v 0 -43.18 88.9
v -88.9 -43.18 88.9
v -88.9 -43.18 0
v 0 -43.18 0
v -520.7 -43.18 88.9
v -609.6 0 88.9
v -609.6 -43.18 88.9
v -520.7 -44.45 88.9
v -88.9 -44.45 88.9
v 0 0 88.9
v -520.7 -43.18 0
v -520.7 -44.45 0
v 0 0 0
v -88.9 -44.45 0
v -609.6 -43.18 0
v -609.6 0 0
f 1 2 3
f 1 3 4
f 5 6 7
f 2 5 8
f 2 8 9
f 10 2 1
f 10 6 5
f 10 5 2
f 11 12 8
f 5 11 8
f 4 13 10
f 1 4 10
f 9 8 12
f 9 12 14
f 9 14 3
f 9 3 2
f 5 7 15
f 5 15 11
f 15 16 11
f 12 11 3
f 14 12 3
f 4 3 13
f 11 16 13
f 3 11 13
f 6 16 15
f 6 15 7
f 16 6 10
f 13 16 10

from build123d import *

# Parameters (mm, degrees)
F0_W     = 609.6
F0_H     = 88.9
F1_DEPTH = 44.45
F2_W     = 88.9
F2_H     = 88.9
F3_DEPTH = 1.27
F4_DEPTH = 1.27


with BuildPart() as f1:
    # F0 (on Front) → F1 (new body)
    with BuildSketch(Plane.XZ):
        with Locations((-304.8, 44.45)):
            Rectangle(F0_W, F0_H)
    extrude(amount=F1_DEPTH)

    # F2 (on face) → F3 (cut)
    with BuildSketch(Plane.XZ.offset(44.45)):
        with Locations((-565.15, 44.45)):
            Rectangle(F2_W, F2_H)
    extrude(amount=-F3_DEPTH, mode=Mode.SUBTRACT)

    # F2 (on face) → F4 (cut)
    with BuildSketch(Plane.XZ.offset(44.45)):
        with Locations((-44.45, 44.45)):
            Rectangle(F2_W, F2_H)
    extrude(amount=-F4_DEPTH, mode=Mode.SUBTRACT)


solid = f1.part
